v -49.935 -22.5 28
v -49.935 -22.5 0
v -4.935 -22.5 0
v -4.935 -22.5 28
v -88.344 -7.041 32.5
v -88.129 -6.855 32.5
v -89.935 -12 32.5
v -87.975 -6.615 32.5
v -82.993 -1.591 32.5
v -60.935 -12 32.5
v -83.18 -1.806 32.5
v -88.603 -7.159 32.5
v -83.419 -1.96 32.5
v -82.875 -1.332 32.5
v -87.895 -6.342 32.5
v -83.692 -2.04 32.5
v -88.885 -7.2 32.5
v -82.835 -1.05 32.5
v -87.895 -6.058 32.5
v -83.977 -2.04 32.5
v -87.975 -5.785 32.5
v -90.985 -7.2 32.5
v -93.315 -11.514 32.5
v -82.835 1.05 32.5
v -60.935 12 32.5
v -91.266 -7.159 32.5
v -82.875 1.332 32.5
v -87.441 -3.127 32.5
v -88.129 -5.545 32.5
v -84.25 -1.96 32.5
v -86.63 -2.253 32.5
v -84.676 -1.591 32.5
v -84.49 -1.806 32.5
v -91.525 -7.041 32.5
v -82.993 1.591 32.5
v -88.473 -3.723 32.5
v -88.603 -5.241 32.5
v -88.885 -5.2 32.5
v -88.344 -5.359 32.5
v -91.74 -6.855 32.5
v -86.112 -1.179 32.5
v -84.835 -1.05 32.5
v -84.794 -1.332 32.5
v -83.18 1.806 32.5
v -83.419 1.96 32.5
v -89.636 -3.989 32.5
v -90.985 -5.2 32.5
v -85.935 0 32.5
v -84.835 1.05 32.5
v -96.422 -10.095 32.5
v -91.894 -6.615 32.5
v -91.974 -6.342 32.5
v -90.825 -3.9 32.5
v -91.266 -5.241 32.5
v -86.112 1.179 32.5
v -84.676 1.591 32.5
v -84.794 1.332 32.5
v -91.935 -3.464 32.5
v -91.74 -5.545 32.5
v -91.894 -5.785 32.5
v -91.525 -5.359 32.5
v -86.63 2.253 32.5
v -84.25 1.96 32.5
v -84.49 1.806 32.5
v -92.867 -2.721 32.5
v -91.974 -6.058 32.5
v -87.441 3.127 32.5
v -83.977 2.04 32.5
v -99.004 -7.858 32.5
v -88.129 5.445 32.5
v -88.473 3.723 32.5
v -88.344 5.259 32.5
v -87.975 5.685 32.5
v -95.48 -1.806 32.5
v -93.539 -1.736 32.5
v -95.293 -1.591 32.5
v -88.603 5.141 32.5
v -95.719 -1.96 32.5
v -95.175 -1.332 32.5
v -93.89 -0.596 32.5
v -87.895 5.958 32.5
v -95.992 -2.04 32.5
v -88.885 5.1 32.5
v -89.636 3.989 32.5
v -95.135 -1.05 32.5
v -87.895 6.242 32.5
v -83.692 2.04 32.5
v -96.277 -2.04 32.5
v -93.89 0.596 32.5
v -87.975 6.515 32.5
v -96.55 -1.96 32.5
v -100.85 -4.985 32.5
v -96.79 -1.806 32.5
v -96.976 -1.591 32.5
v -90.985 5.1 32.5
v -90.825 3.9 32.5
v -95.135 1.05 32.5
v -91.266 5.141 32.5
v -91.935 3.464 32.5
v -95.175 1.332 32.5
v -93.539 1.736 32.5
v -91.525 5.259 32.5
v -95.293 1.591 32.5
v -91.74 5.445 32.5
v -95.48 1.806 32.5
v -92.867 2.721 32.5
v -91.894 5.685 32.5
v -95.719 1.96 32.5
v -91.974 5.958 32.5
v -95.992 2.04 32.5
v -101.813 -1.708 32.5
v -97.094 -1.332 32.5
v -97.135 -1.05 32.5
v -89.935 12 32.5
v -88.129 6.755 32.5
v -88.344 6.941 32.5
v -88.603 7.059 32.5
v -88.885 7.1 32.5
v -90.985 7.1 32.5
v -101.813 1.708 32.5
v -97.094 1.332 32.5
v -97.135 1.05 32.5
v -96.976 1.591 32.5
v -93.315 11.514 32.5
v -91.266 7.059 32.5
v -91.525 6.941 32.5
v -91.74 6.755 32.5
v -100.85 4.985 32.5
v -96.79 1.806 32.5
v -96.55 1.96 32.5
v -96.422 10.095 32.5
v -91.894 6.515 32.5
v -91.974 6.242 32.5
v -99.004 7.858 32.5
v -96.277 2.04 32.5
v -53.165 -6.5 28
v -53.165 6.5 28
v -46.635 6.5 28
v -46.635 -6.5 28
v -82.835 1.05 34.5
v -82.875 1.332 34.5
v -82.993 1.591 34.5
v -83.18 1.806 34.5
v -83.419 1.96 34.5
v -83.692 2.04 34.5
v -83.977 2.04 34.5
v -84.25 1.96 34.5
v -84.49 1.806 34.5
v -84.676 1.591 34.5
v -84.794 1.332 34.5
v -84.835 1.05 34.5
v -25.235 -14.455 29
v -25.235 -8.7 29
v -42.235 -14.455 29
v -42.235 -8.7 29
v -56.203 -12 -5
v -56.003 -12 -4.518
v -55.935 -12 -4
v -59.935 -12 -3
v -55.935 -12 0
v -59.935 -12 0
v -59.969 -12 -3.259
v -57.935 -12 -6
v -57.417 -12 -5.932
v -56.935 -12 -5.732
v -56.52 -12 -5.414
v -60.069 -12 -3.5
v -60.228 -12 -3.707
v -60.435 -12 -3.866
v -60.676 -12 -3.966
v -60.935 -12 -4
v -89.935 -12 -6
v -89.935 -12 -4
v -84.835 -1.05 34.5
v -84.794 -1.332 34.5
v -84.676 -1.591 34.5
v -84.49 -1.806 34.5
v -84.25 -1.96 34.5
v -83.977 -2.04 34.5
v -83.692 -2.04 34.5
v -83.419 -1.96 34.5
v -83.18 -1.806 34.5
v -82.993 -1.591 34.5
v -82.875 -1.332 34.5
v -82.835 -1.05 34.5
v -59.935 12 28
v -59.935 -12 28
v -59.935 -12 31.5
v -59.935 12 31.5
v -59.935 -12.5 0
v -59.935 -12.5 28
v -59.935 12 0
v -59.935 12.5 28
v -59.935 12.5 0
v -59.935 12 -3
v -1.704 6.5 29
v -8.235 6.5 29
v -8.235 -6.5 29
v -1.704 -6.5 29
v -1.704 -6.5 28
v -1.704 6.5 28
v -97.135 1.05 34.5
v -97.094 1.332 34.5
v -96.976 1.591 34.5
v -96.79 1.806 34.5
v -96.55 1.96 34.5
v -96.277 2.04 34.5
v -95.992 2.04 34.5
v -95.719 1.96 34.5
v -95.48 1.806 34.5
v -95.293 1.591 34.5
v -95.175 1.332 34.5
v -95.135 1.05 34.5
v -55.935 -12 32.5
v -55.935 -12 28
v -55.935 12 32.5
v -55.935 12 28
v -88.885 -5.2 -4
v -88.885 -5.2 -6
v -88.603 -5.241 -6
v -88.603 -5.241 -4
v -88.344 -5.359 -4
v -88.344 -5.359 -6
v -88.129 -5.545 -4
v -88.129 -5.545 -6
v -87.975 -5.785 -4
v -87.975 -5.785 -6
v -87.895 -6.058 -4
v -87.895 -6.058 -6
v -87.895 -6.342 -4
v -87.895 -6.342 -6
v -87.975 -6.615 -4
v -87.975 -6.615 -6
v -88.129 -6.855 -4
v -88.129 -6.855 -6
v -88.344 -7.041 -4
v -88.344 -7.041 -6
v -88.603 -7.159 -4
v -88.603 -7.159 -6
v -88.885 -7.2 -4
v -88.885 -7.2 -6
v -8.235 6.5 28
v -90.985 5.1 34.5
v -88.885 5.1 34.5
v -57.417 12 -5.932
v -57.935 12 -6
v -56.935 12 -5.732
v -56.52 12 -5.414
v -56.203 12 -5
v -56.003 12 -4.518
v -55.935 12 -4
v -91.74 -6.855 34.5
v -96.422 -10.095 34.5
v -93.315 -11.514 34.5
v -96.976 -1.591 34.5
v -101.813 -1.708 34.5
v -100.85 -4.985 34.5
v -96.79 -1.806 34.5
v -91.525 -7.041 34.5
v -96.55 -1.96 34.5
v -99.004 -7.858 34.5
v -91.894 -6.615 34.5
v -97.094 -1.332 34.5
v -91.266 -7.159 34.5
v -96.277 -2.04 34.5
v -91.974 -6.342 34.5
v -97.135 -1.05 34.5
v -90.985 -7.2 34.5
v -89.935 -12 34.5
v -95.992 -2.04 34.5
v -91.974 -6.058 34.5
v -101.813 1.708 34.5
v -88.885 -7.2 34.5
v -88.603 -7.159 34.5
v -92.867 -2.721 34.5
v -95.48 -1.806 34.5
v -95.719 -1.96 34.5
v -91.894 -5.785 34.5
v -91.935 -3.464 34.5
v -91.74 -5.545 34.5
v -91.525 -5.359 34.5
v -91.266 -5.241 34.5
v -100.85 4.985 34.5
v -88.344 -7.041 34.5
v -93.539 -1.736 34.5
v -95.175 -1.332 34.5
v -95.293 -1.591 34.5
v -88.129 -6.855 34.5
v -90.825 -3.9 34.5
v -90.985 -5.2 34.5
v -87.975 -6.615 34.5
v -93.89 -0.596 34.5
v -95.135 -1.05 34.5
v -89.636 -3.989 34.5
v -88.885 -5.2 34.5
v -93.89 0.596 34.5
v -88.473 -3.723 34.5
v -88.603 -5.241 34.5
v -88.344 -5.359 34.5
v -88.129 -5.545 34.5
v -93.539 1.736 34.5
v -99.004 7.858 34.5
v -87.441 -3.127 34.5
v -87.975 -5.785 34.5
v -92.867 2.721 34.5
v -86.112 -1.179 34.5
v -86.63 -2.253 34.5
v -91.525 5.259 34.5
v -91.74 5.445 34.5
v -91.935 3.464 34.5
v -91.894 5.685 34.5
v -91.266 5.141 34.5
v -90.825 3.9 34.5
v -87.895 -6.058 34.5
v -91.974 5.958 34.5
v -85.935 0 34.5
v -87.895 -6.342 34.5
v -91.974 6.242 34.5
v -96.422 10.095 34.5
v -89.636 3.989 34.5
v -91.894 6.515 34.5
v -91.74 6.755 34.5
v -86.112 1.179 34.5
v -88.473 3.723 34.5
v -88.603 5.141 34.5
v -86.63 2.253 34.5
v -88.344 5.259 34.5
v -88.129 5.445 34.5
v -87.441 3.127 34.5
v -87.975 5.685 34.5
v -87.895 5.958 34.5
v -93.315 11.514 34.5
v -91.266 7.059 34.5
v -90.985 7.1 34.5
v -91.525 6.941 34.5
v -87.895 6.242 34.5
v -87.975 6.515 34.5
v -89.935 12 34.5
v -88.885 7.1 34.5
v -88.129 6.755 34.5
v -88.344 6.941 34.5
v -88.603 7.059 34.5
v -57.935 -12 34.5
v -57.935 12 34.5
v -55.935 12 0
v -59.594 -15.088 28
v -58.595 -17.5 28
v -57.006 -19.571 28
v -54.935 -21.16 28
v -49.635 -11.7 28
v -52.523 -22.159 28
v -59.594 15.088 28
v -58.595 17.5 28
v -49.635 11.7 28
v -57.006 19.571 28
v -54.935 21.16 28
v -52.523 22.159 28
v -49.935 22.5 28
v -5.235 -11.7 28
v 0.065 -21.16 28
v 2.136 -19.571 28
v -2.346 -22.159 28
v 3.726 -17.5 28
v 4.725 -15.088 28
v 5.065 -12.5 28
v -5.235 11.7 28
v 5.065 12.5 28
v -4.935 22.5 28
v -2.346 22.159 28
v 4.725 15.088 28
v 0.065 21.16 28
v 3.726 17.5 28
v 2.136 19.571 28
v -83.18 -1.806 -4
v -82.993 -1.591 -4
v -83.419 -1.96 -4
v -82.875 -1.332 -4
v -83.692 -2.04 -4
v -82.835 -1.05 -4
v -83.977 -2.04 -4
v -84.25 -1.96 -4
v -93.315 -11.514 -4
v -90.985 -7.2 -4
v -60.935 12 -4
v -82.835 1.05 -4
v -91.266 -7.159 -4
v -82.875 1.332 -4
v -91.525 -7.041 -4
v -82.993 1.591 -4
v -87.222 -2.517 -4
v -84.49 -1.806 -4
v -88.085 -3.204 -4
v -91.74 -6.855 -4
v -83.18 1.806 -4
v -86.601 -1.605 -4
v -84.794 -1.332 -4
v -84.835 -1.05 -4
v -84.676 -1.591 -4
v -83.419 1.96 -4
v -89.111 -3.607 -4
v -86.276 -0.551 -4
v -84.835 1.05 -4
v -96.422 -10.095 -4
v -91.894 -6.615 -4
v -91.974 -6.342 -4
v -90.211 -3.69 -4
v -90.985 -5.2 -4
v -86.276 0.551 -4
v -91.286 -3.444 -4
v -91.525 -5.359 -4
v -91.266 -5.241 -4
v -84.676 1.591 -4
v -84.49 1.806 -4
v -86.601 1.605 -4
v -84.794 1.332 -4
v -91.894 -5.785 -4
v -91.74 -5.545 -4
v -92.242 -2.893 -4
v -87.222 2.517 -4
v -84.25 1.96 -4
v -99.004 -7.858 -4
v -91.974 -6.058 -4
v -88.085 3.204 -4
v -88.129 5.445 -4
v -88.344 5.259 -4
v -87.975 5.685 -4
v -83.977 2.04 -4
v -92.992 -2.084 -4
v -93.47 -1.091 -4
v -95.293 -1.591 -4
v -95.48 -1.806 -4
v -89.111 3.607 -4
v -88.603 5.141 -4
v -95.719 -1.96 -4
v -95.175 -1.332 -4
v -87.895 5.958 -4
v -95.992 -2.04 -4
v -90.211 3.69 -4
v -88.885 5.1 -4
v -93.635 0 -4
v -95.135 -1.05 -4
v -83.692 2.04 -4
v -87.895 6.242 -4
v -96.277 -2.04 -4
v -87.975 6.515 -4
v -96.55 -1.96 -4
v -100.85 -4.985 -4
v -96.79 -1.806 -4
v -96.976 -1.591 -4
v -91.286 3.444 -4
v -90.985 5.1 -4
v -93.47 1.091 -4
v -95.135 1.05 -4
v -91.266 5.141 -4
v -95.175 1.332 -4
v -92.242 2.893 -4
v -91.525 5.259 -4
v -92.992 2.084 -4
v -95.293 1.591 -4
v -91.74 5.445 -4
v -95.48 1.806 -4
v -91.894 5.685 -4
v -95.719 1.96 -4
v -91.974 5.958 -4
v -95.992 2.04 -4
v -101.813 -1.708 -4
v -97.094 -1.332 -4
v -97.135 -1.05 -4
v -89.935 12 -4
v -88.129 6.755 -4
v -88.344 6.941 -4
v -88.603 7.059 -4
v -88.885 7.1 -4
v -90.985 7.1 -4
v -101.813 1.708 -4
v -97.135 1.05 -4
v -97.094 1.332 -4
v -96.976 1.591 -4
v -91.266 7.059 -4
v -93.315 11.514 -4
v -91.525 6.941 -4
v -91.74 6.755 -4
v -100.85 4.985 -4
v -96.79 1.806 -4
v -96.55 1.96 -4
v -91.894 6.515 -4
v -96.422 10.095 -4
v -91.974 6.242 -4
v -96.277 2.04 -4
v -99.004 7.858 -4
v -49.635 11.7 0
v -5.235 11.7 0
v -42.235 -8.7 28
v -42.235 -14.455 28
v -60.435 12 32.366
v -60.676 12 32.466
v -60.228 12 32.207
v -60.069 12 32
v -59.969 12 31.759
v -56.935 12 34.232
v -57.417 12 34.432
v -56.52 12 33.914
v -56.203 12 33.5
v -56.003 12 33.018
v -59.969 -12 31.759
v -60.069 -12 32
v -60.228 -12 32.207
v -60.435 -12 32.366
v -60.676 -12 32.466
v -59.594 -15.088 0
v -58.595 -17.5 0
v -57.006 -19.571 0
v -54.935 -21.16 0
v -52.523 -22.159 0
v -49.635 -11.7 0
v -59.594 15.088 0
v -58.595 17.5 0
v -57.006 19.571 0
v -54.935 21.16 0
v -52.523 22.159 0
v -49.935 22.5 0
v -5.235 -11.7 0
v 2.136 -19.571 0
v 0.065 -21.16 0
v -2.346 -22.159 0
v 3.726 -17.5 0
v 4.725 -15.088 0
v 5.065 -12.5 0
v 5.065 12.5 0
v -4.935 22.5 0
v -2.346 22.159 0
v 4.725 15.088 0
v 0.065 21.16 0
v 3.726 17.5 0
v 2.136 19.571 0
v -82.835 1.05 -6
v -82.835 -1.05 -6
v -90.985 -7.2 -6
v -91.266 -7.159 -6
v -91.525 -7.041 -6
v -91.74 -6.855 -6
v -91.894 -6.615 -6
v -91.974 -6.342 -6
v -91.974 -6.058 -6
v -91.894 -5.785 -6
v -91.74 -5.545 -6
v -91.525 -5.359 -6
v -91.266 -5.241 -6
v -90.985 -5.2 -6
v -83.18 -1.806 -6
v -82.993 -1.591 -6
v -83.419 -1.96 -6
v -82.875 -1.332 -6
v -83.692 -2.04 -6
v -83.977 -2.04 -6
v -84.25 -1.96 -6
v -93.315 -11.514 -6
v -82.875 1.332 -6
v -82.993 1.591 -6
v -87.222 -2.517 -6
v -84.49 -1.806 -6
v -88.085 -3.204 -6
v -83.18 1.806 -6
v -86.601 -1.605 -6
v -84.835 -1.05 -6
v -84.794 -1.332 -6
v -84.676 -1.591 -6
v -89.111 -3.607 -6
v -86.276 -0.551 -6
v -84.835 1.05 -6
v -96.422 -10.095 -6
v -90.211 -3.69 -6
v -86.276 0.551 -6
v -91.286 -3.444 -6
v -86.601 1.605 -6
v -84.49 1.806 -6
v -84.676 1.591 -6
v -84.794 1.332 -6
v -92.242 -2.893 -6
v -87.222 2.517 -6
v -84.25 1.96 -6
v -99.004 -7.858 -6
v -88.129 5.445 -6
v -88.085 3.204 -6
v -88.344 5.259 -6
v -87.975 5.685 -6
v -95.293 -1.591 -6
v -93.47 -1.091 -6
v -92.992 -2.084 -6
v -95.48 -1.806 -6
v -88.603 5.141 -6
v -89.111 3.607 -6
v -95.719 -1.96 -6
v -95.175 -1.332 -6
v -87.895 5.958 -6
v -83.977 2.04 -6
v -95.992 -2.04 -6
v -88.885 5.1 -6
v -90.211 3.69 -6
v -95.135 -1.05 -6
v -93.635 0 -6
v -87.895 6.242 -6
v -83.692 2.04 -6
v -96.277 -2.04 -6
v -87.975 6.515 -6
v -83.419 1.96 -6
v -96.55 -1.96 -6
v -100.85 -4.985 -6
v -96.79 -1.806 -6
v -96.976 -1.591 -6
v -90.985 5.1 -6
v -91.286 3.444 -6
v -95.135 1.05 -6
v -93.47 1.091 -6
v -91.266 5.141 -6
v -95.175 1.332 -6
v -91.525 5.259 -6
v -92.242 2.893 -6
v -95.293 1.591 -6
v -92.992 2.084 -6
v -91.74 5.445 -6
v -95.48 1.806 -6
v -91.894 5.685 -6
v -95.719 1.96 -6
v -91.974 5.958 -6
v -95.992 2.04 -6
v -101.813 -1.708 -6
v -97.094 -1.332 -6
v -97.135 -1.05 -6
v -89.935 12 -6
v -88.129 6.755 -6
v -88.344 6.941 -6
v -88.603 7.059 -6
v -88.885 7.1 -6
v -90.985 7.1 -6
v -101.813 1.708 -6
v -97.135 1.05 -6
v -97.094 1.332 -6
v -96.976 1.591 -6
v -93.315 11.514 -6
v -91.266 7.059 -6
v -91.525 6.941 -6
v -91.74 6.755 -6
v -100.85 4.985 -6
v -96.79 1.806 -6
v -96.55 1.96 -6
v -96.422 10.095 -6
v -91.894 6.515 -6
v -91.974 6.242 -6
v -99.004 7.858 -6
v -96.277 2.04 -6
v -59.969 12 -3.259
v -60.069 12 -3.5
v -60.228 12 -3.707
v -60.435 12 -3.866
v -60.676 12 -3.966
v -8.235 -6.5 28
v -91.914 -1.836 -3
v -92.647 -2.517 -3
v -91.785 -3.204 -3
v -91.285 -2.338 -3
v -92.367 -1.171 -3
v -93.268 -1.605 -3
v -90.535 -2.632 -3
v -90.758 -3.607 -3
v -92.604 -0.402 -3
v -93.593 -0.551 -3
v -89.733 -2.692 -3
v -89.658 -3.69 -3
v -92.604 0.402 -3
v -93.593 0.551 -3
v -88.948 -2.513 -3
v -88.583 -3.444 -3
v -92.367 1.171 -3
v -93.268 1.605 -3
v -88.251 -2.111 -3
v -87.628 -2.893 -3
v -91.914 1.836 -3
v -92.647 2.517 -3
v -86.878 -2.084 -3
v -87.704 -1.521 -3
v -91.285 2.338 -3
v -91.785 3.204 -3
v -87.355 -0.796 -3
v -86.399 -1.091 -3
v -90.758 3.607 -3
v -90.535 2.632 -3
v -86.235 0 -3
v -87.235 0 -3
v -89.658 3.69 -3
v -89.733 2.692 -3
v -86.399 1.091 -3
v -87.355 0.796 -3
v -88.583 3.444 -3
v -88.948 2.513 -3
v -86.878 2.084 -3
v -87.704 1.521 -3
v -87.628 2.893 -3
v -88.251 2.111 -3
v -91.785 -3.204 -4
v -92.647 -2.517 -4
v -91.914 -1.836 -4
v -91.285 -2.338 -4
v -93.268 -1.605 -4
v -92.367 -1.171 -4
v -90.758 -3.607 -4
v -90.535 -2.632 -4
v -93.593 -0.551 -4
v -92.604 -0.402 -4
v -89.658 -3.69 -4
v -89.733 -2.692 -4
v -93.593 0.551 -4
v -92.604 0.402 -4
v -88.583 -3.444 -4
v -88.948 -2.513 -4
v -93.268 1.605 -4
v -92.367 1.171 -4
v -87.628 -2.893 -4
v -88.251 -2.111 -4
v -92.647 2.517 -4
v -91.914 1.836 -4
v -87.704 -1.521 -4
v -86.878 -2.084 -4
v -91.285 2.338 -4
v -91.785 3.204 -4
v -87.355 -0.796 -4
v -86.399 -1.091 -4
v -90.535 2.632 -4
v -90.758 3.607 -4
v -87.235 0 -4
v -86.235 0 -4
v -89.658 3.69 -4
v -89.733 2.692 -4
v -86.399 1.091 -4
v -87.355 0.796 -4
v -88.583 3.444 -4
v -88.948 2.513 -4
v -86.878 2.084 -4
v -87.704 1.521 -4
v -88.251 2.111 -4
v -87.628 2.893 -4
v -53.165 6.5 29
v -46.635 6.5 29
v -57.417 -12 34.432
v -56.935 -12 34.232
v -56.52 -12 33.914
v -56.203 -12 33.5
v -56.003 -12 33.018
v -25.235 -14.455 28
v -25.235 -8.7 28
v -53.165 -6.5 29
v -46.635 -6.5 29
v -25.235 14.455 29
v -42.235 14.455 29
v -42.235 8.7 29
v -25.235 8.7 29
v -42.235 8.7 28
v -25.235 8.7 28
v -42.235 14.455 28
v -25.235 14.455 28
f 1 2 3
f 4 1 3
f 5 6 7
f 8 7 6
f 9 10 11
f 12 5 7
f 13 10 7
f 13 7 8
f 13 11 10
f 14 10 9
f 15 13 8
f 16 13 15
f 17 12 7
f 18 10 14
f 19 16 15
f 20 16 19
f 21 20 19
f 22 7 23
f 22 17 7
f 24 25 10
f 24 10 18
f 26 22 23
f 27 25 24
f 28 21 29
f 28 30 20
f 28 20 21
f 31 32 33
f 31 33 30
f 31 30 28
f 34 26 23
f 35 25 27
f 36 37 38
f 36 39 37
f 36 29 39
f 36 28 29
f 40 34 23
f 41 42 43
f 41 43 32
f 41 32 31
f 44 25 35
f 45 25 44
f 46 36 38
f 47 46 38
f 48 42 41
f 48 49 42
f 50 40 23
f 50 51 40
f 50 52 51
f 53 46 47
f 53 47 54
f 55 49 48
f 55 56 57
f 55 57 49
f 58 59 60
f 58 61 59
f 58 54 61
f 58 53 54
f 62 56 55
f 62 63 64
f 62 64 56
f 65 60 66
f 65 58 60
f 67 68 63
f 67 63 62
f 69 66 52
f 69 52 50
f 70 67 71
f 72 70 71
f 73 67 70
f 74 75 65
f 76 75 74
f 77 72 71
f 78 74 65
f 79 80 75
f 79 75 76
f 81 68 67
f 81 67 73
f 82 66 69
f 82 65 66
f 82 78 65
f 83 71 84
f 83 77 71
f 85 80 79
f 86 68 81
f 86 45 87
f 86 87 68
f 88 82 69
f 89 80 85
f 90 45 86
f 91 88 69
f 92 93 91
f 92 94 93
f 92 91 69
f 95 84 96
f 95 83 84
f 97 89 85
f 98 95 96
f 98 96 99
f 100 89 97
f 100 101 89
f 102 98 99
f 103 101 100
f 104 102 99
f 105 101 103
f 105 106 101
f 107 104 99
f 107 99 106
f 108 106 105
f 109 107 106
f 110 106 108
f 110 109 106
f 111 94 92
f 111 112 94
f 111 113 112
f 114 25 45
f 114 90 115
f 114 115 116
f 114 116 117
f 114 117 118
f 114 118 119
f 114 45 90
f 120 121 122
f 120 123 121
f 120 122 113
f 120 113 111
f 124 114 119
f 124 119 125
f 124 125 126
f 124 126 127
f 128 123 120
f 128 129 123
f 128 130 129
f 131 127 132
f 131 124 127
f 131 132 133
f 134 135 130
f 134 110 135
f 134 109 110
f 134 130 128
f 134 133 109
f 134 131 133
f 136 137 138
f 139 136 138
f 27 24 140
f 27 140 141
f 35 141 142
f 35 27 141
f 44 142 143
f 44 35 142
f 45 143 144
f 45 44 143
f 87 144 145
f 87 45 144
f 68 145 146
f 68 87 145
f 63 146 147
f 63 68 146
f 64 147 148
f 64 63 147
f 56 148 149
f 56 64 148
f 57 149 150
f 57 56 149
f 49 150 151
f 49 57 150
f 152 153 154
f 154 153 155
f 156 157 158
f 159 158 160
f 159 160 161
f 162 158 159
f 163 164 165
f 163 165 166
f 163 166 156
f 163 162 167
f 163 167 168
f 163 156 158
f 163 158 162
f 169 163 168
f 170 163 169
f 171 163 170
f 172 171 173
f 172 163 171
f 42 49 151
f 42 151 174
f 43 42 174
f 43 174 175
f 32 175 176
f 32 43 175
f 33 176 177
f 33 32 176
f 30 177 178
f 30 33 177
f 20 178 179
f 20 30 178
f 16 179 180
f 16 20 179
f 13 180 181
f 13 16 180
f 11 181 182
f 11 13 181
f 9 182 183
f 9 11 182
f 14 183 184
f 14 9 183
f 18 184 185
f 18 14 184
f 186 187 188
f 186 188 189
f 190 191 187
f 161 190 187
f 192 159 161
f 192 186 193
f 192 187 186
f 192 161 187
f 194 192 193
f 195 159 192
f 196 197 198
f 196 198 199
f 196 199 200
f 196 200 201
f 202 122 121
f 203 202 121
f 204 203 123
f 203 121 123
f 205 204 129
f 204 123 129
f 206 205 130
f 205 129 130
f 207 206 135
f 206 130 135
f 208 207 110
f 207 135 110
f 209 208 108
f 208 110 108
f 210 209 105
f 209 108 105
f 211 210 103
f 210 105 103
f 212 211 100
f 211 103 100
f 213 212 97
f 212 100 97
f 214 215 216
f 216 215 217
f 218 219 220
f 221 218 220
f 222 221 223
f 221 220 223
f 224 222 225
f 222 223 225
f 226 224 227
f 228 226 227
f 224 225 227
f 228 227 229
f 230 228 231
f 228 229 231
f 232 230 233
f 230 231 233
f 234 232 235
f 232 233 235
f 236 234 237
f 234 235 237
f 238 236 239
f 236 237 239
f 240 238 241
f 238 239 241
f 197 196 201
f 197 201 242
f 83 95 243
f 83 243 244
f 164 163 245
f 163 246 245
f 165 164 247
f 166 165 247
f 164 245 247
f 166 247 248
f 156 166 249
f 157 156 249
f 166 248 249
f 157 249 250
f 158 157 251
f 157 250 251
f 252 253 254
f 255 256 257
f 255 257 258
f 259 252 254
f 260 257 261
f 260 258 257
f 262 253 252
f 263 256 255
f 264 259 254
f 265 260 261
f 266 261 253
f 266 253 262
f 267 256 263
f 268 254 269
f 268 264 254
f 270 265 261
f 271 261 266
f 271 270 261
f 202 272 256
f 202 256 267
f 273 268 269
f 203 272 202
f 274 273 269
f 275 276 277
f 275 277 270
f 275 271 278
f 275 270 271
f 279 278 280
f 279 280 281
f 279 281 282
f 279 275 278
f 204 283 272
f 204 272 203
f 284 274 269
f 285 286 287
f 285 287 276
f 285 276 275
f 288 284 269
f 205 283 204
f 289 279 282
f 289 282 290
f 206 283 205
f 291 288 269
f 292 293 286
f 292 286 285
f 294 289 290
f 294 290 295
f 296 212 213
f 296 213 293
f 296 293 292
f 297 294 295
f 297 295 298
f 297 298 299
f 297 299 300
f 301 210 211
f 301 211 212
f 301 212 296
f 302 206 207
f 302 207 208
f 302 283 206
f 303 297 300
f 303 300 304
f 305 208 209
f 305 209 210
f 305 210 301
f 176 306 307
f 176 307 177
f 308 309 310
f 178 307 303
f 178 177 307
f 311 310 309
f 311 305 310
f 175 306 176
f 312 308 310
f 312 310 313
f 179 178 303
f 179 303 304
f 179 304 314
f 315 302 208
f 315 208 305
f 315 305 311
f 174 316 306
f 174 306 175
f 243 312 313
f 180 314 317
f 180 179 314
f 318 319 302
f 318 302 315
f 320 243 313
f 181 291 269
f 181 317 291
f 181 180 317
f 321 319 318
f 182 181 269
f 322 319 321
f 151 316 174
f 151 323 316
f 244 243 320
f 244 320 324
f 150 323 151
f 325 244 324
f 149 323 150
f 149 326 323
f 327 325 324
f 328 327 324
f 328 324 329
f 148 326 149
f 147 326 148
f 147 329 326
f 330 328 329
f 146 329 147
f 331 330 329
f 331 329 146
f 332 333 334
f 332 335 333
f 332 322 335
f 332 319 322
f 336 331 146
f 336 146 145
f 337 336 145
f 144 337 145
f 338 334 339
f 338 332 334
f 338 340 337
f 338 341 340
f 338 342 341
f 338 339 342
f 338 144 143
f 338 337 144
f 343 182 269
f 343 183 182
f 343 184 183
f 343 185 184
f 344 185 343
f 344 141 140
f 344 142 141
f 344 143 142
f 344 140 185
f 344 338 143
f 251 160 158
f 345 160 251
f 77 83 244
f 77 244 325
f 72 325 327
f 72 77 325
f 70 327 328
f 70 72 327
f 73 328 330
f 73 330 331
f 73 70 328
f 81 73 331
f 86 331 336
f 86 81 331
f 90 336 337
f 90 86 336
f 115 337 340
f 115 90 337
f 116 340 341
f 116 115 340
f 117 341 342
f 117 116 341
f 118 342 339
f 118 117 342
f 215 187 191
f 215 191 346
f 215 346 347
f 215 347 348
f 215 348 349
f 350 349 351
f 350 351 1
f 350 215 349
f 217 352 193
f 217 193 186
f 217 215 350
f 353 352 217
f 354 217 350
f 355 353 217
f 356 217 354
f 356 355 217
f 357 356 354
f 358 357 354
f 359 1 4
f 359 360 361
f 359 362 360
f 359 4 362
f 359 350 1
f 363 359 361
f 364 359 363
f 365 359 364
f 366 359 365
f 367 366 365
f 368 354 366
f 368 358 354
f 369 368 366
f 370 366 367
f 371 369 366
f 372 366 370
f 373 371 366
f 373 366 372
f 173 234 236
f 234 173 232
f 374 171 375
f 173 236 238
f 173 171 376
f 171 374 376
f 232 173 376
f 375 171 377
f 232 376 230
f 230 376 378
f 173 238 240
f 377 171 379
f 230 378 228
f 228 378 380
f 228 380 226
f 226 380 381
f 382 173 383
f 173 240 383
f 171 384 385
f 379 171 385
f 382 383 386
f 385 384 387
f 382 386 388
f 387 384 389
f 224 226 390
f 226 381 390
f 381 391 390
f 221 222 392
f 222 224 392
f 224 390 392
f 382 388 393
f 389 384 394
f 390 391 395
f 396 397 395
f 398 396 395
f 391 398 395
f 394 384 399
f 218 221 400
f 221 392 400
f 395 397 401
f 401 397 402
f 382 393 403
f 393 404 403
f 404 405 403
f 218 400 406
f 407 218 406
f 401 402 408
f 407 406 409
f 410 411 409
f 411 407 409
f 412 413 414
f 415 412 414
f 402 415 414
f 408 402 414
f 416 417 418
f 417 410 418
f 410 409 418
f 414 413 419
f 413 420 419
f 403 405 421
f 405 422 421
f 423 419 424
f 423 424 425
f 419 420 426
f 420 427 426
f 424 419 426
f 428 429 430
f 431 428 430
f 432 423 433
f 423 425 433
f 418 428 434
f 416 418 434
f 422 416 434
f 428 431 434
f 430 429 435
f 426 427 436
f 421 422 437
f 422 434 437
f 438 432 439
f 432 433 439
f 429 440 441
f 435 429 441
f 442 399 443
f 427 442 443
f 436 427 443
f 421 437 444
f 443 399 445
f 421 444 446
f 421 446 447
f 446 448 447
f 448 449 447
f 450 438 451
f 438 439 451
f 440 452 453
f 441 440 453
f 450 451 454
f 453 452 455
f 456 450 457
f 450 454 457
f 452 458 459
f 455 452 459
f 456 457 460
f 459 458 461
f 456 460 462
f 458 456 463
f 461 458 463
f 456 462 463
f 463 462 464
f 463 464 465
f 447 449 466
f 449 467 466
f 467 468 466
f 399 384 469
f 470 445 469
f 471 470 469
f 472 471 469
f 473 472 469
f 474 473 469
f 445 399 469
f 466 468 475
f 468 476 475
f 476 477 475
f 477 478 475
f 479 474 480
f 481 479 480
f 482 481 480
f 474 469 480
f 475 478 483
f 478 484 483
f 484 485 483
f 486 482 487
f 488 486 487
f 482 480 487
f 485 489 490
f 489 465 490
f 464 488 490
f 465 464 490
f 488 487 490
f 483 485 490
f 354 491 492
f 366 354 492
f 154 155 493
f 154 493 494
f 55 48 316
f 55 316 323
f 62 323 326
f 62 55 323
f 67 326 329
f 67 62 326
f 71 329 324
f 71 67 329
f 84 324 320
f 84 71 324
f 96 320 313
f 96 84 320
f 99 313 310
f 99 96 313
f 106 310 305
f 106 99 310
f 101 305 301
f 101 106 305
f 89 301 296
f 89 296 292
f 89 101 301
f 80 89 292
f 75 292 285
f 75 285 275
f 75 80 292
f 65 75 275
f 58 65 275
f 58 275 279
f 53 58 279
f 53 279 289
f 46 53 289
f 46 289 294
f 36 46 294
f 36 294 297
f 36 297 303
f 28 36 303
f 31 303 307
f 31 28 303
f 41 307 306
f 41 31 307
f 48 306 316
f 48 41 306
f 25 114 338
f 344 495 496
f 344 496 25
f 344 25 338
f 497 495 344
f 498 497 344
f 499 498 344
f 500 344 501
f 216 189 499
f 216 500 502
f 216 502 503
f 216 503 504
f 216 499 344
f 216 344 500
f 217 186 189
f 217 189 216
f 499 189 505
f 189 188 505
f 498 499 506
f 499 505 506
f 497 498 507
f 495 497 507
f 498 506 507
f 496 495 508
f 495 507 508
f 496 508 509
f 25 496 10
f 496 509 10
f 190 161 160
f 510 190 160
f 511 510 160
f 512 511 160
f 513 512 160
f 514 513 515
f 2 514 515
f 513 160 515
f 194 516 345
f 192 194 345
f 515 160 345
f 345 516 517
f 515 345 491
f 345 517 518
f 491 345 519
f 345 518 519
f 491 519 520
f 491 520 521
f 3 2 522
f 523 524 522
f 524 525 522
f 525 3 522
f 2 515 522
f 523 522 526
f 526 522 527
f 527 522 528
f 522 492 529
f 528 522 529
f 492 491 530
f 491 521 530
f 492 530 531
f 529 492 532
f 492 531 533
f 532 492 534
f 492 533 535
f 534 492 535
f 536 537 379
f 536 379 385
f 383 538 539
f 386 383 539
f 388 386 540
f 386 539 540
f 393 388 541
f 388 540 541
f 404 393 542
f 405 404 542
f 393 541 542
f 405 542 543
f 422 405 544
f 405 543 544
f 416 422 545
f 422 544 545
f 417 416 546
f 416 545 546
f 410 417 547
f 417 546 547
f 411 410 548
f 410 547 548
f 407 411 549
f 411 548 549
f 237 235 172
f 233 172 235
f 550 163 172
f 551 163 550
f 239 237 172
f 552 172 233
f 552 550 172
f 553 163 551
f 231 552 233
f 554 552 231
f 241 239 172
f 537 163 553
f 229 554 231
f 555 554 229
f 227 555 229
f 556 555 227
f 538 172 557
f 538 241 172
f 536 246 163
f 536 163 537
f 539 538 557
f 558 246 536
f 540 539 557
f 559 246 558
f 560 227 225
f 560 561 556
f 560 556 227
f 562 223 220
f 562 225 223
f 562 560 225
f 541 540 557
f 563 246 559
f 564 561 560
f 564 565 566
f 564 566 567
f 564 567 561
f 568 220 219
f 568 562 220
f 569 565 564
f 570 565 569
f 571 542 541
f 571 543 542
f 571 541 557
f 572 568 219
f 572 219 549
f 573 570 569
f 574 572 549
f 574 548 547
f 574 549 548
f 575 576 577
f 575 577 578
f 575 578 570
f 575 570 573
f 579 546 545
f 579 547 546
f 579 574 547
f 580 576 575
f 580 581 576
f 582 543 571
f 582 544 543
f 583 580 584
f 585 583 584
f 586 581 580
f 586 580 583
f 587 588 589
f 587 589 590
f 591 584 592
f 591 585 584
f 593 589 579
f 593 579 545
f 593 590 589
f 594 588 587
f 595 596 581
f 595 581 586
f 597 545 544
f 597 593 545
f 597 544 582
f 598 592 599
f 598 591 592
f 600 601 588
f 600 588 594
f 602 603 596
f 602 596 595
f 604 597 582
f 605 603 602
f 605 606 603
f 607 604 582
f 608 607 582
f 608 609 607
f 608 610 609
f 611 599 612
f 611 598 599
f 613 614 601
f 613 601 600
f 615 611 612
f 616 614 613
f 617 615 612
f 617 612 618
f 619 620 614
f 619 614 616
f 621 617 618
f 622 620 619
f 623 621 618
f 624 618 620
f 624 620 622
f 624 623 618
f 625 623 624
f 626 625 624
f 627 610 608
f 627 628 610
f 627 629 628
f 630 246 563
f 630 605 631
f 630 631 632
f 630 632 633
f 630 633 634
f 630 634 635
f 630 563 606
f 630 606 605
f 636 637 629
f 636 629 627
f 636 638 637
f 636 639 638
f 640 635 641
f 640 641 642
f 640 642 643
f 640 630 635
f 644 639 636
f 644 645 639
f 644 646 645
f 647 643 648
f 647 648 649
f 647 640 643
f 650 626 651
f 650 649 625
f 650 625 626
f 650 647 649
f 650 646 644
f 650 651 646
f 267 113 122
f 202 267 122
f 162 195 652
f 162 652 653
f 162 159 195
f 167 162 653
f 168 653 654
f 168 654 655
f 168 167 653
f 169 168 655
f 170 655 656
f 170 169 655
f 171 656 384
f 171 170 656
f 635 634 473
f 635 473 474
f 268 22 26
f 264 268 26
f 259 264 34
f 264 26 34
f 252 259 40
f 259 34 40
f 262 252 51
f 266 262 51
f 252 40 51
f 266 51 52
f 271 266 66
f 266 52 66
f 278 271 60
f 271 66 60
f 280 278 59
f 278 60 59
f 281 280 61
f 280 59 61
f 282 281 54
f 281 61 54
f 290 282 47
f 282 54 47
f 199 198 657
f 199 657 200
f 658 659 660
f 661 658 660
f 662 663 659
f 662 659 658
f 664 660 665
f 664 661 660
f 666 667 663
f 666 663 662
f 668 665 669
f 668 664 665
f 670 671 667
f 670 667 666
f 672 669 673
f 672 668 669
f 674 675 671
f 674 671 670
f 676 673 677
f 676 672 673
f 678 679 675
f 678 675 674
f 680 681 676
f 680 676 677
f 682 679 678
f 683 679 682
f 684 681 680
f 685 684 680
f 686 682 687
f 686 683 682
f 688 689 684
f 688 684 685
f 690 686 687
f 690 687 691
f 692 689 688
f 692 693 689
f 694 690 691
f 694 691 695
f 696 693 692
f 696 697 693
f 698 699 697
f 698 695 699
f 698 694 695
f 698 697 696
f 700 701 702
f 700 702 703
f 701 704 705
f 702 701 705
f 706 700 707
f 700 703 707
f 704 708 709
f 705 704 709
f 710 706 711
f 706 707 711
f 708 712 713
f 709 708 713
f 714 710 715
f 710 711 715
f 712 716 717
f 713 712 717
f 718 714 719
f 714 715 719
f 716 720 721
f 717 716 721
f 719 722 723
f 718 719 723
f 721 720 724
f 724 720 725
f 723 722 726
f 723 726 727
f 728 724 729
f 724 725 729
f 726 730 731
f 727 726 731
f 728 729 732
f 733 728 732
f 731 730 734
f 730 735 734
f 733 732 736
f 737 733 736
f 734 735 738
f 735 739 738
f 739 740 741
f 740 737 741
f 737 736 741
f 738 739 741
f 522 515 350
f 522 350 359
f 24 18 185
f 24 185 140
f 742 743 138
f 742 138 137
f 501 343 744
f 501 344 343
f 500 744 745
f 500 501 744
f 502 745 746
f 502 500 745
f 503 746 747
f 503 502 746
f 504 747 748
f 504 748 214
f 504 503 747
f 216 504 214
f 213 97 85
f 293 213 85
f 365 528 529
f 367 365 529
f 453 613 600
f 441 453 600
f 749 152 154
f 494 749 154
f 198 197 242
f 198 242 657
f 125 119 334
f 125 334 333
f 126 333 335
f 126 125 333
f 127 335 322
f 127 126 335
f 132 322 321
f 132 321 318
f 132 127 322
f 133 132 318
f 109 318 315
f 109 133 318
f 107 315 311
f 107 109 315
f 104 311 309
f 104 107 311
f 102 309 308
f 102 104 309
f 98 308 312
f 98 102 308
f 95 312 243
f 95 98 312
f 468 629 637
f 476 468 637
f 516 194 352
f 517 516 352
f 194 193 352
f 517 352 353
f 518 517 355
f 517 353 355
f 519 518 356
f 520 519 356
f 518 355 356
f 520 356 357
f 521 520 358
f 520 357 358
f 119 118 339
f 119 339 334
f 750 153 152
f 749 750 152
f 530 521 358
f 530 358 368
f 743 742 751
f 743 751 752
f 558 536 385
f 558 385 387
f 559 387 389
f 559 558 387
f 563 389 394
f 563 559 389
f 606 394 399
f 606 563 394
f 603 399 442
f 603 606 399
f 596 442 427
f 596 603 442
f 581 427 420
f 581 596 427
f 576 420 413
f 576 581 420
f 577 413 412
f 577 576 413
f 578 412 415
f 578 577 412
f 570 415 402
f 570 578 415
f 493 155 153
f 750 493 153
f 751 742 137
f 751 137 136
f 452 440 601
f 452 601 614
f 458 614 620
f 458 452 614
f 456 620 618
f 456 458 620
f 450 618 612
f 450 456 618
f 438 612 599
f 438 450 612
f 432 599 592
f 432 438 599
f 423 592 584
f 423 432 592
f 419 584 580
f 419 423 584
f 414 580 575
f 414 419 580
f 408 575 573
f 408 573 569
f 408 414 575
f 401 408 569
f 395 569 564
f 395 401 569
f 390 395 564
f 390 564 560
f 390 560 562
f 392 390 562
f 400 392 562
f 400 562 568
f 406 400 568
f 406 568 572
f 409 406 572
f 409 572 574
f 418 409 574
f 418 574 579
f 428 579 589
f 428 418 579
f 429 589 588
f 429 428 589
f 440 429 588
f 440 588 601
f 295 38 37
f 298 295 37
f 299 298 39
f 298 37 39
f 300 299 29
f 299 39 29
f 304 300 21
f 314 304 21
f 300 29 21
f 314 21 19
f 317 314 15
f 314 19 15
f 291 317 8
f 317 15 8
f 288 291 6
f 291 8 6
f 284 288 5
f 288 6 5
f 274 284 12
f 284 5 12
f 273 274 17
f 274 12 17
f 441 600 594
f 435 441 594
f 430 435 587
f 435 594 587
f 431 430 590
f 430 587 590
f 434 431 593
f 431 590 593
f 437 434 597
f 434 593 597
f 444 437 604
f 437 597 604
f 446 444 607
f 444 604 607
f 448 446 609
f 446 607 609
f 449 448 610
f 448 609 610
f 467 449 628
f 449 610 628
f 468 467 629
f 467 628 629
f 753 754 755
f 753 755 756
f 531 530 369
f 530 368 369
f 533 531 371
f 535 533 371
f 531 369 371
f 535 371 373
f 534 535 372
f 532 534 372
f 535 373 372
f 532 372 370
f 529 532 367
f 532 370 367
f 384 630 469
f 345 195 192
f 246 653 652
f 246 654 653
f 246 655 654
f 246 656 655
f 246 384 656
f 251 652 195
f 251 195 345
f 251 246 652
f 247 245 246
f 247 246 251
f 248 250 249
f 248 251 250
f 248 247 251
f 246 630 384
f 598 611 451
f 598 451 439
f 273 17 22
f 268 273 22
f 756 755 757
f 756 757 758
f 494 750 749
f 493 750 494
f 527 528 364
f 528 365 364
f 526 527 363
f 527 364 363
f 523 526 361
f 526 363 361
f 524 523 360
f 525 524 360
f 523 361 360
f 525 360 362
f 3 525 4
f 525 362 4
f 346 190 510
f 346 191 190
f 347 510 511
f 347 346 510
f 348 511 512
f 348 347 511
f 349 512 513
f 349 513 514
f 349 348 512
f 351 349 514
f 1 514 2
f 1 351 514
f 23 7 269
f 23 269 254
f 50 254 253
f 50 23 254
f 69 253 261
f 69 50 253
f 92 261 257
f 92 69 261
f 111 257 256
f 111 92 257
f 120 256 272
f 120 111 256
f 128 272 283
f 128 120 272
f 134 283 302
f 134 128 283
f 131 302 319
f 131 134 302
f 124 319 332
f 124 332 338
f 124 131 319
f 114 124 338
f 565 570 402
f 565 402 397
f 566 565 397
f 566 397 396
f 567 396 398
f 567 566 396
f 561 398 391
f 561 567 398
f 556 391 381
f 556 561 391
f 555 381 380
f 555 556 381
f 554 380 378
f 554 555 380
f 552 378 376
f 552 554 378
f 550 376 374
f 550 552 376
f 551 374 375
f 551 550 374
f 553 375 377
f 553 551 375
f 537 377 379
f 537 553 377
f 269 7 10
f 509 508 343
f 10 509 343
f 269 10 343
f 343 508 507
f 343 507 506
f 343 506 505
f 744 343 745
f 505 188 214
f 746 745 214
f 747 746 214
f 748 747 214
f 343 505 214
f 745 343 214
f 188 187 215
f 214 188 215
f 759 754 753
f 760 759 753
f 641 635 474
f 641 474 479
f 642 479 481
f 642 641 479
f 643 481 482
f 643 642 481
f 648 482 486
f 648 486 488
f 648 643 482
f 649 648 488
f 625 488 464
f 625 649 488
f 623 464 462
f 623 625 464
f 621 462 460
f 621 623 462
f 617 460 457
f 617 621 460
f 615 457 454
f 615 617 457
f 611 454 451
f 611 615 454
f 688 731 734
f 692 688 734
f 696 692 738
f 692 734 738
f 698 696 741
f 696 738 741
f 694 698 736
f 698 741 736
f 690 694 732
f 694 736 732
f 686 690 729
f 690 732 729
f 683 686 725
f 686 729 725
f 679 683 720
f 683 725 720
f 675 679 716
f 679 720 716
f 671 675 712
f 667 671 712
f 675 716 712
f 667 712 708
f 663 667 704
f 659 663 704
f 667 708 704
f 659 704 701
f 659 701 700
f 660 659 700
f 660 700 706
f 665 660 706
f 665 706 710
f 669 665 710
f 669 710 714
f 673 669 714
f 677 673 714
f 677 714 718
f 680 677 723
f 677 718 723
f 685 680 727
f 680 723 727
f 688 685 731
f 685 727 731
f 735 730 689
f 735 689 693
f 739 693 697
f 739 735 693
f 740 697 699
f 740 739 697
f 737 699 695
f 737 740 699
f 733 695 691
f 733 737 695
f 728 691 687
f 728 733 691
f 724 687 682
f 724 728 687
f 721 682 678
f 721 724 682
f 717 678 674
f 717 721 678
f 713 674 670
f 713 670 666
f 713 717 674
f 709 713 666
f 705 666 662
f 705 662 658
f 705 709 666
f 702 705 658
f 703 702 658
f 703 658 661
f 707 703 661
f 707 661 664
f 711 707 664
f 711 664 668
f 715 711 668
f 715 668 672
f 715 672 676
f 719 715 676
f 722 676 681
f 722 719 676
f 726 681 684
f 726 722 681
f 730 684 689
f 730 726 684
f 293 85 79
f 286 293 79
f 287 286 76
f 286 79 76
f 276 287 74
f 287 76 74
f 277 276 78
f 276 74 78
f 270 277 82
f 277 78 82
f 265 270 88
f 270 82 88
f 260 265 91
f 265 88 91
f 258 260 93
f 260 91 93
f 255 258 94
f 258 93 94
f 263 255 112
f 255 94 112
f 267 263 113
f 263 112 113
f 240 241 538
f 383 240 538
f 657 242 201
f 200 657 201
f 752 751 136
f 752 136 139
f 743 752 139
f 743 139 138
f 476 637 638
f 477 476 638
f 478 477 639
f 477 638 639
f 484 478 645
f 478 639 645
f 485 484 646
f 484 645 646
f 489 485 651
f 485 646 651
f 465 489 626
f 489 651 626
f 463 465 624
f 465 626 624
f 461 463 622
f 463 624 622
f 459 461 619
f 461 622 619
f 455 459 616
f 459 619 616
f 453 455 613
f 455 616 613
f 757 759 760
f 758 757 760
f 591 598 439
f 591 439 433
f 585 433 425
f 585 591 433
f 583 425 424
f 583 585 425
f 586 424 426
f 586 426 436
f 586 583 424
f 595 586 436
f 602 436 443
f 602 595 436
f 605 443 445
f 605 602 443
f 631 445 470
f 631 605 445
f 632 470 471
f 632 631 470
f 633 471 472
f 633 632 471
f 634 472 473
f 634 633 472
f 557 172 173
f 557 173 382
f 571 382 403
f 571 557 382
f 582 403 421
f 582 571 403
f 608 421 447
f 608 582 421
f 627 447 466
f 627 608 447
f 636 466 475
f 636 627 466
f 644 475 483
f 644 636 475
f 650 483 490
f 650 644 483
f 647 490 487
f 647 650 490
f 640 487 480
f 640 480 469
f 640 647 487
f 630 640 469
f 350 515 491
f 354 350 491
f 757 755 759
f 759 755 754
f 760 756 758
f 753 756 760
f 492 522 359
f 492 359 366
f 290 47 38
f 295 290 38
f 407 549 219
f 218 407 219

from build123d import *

# Parameters (mm, degrees)
SKETCH_1_W             = 65
SKETCH_1_H             = 45
EXTRUDE_1_DEPTH        = 28
SKETCH_2_W             = 44.4
SKETCH_2_H             = 23.4
CUT_EXTRUDE_1_DEPTH    = 39
SKETCH_3_W             = 4
SKETCH_3_H             = 24
EXTRUDE_2_DEPTH        = 6
EXTRUDE_START          = -0.5
SKETCH_7_R             = 4
EXTRUDE_3_DEPTH        = 2
SKETCH_8_W             = 4
SKETCH_8_H             = 24
EXTRUDE_4_DEPTH        = 6
FILLET_1_R             = 10
FILLET_2_R             = 10
FILLET_3_R             = 10
FILLET_4_R             = 10
PATTERN_LINEAR_2_COUNT = 2
PATTERN_LINEAR_2_PITCH = 38.5
FILLET_5_R             = 2
SKETCH_9_R             = 3.7
SKETCH_9_R_2           = 2.7
EXTRUDE_5_DEPTH        = 1
EXTRUDE_6_DEPTH        = 1
EXTRUDE_6_2_DEPTH      = 1
EXTRUDE_6_3_DEPTH      = 1
SKETCH_10_W            = 17
SKETCH_10_H            = 5.754584259
EXTRUDE_6_4_DEPTH      = 1
SKETCH_12_R            = 4
SKETCH_12_R_2          = 3.7
EXTRUDE_8_DEPTH        = 2
SKETCH_15_W            = 4
SKETCH_15_H            = 24
EXTRUDE_10_DEPTH       = 0.5
FILLET_16_R            = 2
FILLET_17_R            = 1
FILLET_18_R            = 1


with BuildPart() as part:
    # 草圖1 → 填料-伸長1 (new body)
    with BuildSketch(Plane.XY):
        with Locations((-27.434655272, 0)):
            Rectangle(SKETCH_1_W, SKETCH_1_H)
    extrude(amount=EXTRUDE_1_DEPTH)

    # 草圖2 → 除料-伸長1 (cut)
    with BuildSketch(Plane.XY):
        with Locations((-27.434655272, 0)):
            Rectangle(SKETCH_2_W, SKETCH_2_H)
    extrude(amount=CUT_EXTRUDE_1_DEPTH, mode=Mode.SUBTRACT)

    # 草圖3 → 填料-伸長2 (add)
    with BuildSketch(Plane.XY.offset(28)):
        with Locations((-57.934655272, 0)):
            Rectangle(SKETCH_3_W, SKETCH_3_H)
    extrude(amount=EXTRUDE_2_DEPTH)

    # 草圖7 → 填料-伸長3 (add)
    with BuildSketch(Plane.XY.offset(33).offset(EXTRUDE_START)):
        with BuildLine():
            Line((-59.934655272, 12), (-59.934655272, -12))
            Line((-59.934655272, -12), (-89.934655272, -12))
            ThreePointArc((-89.934655272, -12), (-101.934655272, 0), (-89.934655272, 12))
            Line((-89.934655272, 12), (-59.934655272, 12))
        make_face()
        with Locations((-89.934655272, 0)):
            Circle(SKETCH_7_R, mode=Mode.SUBTRACT)
        with BuildLine():
            Line((-95.134655272, 1.05), (-95.134655272, -1.05))
            ThreePointArc((-95.134655272, -1.05), (-96.134655272, -2.05), (-97.134655272, -1.05))
            Line((-97.134655272, -1.05), (-97.134655272, 1.05))
            ThreePointArc((-97.134655272, 1.05), (-96.134655272, 2.05), (-95.134655272, 1.05))
        make_face(mode=Mode.SUBTRACT)
        with BuildLine():
            Line((-90.984655272, -5.2), (-88.884655272, -5.2))
            ThreePointArc((-88.884655272, -5.2), (-87.884655272, -6.2), (-88.884655272, -7.2))
            Line((-88.884655272, -7.2), (-90.984655272, -7.2))
            ThreePointArc((-90.984655272, -7.2), (-91.984655272, -6.2), (-90.984655272, -5.2))
        make_face(mode=Mode.SUBTRACT)
        with BuildLine():
            Line((-90.984655272, 5.1), (-88.884655272, 5.1))
            ThreePointArc((-88.884655272, 5.1), (-87.884655272, 6.1), (-88.884655272, 7.1))
            Line((-88.884655272, 7.1), (-90.984655272, 7.1))
            ThreePointArc((-90.984655272, 7.1), (-91.984655272, 6.1), (-90.984655272, 5.1))
        make_face(mode=Mode.SUBTRACT)
        with BuildLine():
            Line((-84.834655272, 1.05), (-84.834655272, -1.05))
            ThreePointArc((-84.834655272, -1.05), (-83.834655272, -2.05), (-82.834655272, -1.05))
            Line((-82.834655272, -1.05), (-82.834655272, 1.05))
            ThreePointArc((-82.834655272, 1.05), (-83.834655272, 2.05), (-84.834655272, 1.05))
        make_face(mode=Mode.SUBTRACT)
    extrude_3 = extrude(amount=EXTRUDE_3_DEPTH)

    # 草圖8 → 填料-伸長4 (add)
    with BuildSketch(Plane(origin=(0, 0, 0), x_dir=(-1, 0, 0), z_dir=(0, 0, -1))):
        with Locations((57.934655272, 0)):
            Rectangle(SKETCH_8_W, SKETCH_8_H)
    extrude(amount=EXTRUDE_4_DEPTH)

    # 圓角1
    fillet_1_edges = [part.edges().sort_by_distance(p)[0] for p in [
        (-59.934655272, -22.5, 14),
    ]]
    fillet(fillet_1_edges, radius=FILLET_1_R)

    # 圓角2
    fillet_2_edges = [part.edges().sort_by_distance(p)[0] for p in [
        (-59.934655272, 22.5, 14),
    ]]
    fillet(fillet_2_edges, radius=FILLET_2_R)

    # 圓角3
    fillet_3_edges = [part.edges().sort_by_distance(p)[0] for p in [
        (5.065344728, 22.5, 14),
    ]]
    fillet(fillet_3_edges, radius=FILLET_3_R)

    # 圓角4
    fillet_4_edges = [part.edges().sort_by_distance(p)[0] for p in [
        (5.065344728, -22.5, 14),
    ]]
    fillet(fillet_4_edges, radius=FILLET_4_R)

    # 直線複製排列2: 填料-伸長3 ×2
    with Locations(*[(0, 0, -i * PATTERN_LINEAR_2_PITCH) for i in range(1, PATTERN_LINEAR_2_COUNT)]):
        add(extrude_3)

    # 圓角5
    fillet_5_edges = [part.edges().sort_by_distance(p)[0] for p in [
        (-55.934655272, 0, -6),
    ]]
    fillet(fillet_5_edges, radius=FILLET_5_R)

    # 草圖12 → 填料-伸長8 (add)
    with BuildSketch(Plane(origin=(0, 0, -4), x_dir=(-1, 0, 0), z_dir=(0, 0, -1))):
        with Locations((89.934655272, 0)):
            Circle(SKETCH_12_R)
        with Locations((89.934655272, 0)):
            Circle(SKETCH_12_R_2, mode=Mode.SUBTRACT)
    extrude(amount=EXTRUDE_8_DEPTH)

    # 草圖15 → 填料-伸長10 (add)
    with BuildSketch(Plane.XY.offset(34)):
        with Locations((-57.934655272, 0)):
            Rectangle(SKETCH_15_W, SKETCH_15_H)
    extrude(amount=EXTRUDE_10_DEPTH)

    # 圓角16
    fillet_16_edges = [part.edges().sort_by_distance(p)[0] for p in [
        (-55.934655272, 0, 34.5),
    ]]
    fillet(fillet_16_edges, radius=FILLET_16_R)

    # 圓角17
    fillet_17_edges = [part.edges().sort_by_distance(p)[0] for p in [
        (-59.934655272, 0, 32.5),
    ]]
    fillet(fillet_17_edges, radius=FILLET_17_R)

    # 圓角18
    fillet_18_edges = [part.edges().sort_by_distance(p)[0] for p in [
        (-59.934655272, 0, -4),
    ]]
    fillet(fillet_18_edges, radius=FILLET_18_R)


with BuildPart() as body_2:
    # 草圖9 → 填料-伸長5 (new body)
    with BuildSketch(Plane.XY.offset(-4)):
        with Locations((-89.934655272, 0)):
            Circle(SKETCH_9_R)
        with Locations((-89.934655272, 0)):
            Circle(SKETCH_9_R_2, mode=Mode.SUBTRACT)
    extrude(amount=EXTRUDE_5_DEPTH)


with BuildPart() as body_3:
    # 草圖10 → 填料-伸長6 (new body)
    with BuildSketch(Plane.XY.offset(29)):
        Polygon((-49.634655272, 6.5), (-53.165057103, 6.5), (-53.165057103, -6.5), (-46.634655272, -6.5), (-46.634655272, 6.5), align=None)
    extrude(amount=-EXTRUDE_6_DEPTH)


with BuildPart() as body_4:
    # 草圖10 → Extrude 6 2 (new body)
    with BuildSketch(Plane.XY.offset(29)):
        Polygon((-42.234655272, -11.7), (-42.234655272, -8.7), (-25.234655272, -8.7), (-25.234655272, -14.454584259), (-42.234655272, -14.454584259), align=None)
    extrude(amount=-EXTRUDE_6_2_DEPTH)


with BuildPart() as body_5:
    # 草圖10 → Extrude 6 3 (new body)
    with BuildSketch(Plane.XY.offset(29)):
        Polygon((-8.234655272, 6.5), (-8.234655272, -6.5), (-5.234655272, -6.5), (-1.70425344, -6.5), (-1.70425344, 6.5), align=None)
    extrude(amount=-EXTRUDE_6_3_DEPTH)


with BuildPart() as body_6:
    # 草圖10 → Extrude 6 4 (new body)
    with BuildSketch(Plane.XY.offset(29)):
        with Locations((-33.734655272, 11.57729213)):
            Rectangle(SKETCH_10_W, SKETCH_10_H)
    extrude(amount=-EXTRUDE_6_4_DEPTH)


solid = Compound([part.part, body_2.part, body_3.part, body_4.part, body_5.part, body_6.part])
